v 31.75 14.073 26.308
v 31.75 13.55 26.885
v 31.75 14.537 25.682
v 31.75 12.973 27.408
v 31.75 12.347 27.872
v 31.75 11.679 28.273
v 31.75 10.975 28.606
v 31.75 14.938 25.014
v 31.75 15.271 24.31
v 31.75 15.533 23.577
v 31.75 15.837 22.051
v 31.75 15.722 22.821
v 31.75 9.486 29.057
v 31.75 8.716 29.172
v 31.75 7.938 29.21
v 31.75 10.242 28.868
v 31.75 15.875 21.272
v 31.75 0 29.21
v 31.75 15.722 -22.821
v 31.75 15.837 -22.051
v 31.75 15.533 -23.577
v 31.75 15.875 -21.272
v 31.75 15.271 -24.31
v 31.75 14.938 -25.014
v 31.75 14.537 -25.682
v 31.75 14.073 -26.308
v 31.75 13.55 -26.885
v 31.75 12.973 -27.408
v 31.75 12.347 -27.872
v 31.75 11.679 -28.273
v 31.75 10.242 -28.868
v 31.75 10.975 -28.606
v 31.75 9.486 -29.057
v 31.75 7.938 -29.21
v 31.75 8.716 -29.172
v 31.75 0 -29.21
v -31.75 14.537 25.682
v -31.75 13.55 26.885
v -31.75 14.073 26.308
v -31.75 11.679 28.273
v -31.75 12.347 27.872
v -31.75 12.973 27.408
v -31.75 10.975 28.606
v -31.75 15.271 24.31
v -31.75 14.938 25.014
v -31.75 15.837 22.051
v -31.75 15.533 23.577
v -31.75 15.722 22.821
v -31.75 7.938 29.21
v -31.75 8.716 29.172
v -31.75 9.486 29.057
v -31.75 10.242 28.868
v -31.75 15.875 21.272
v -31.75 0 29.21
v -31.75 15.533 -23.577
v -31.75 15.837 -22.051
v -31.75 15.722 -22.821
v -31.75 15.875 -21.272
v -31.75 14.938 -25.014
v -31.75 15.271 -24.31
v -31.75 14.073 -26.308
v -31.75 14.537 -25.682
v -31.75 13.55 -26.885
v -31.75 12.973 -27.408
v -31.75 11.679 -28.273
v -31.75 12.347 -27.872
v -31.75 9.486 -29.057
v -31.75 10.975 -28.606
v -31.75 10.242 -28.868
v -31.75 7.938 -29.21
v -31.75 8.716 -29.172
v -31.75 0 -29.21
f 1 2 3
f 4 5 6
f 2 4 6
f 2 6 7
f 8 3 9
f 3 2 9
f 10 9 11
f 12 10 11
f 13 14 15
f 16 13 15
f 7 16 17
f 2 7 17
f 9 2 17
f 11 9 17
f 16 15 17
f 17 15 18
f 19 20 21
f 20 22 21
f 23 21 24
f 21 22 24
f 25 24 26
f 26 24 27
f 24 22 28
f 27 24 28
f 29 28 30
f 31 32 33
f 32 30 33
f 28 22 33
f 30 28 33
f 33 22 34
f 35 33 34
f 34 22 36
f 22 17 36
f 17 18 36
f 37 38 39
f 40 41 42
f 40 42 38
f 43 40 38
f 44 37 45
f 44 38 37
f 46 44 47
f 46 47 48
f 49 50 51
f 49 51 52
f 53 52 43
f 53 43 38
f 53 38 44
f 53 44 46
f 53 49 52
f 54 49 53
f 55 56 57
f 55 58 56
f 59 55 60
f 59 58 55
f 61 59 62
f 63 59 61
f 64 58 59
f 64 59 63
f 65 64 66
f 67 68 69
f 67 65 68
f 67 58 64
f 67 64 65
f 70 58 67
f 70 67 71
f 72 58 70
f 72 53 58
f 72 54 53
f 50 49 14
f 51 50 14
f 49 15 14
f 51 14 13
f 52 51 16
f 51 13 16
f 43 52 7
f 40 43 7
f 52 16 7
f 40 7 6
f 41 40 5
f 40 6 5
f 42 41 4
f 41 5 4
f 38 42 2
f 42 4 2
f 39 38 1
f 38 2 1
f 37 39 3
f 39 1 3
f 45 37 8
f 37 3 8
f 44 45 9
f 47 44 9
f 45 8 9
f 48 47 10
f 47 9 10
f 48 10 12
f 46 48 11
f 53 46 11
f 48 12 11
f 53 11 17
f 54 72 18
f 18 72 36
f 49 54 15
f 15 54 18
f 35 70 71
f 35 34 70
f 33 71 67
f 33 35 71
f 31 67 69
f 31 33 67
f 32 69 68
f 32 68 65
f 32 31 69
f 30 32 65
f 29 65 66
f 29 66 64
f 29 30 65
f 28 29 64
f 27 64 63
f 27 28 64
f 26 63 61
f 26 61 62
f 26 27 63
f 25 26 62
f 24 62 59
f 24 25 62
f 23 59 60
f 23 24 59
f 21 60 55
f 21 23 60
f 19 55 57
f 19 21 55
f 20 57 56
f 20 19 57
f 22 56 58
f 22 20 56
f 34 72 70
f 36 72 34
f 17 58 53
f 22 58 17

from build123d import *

# Parameters (mm, degrees)
SKETCH1_W           = 63.5
SKETCH1_H           = 58.42
BOSS_EXTRUDE1_DEPTH = 15.875
FILLET1_R           = 7.9375


with BuildPart() as part:
    # Sketch1 → Boss-Extrude1 (new body)
    with BuildSketch(Plane(origin=(0, 0, 0), x_dir=(1, 0, 0), z_dir=(0, 1, 0))):
        Rectangle(SKETCH1_W, SKETCH1_H)
    extrude(amount=BOSS_EXTRUDE1_DEPTH)

    # Fillet1
    fillet1_edges = [part.edges().sort_by_distance(p)[0] for p in [
        (0, 15.875, 29.21),
        (0, 15.875, -29.21),
    ]]
    fillet(fillet1_edges, radius=FILLET1_R)


solid = part.part
